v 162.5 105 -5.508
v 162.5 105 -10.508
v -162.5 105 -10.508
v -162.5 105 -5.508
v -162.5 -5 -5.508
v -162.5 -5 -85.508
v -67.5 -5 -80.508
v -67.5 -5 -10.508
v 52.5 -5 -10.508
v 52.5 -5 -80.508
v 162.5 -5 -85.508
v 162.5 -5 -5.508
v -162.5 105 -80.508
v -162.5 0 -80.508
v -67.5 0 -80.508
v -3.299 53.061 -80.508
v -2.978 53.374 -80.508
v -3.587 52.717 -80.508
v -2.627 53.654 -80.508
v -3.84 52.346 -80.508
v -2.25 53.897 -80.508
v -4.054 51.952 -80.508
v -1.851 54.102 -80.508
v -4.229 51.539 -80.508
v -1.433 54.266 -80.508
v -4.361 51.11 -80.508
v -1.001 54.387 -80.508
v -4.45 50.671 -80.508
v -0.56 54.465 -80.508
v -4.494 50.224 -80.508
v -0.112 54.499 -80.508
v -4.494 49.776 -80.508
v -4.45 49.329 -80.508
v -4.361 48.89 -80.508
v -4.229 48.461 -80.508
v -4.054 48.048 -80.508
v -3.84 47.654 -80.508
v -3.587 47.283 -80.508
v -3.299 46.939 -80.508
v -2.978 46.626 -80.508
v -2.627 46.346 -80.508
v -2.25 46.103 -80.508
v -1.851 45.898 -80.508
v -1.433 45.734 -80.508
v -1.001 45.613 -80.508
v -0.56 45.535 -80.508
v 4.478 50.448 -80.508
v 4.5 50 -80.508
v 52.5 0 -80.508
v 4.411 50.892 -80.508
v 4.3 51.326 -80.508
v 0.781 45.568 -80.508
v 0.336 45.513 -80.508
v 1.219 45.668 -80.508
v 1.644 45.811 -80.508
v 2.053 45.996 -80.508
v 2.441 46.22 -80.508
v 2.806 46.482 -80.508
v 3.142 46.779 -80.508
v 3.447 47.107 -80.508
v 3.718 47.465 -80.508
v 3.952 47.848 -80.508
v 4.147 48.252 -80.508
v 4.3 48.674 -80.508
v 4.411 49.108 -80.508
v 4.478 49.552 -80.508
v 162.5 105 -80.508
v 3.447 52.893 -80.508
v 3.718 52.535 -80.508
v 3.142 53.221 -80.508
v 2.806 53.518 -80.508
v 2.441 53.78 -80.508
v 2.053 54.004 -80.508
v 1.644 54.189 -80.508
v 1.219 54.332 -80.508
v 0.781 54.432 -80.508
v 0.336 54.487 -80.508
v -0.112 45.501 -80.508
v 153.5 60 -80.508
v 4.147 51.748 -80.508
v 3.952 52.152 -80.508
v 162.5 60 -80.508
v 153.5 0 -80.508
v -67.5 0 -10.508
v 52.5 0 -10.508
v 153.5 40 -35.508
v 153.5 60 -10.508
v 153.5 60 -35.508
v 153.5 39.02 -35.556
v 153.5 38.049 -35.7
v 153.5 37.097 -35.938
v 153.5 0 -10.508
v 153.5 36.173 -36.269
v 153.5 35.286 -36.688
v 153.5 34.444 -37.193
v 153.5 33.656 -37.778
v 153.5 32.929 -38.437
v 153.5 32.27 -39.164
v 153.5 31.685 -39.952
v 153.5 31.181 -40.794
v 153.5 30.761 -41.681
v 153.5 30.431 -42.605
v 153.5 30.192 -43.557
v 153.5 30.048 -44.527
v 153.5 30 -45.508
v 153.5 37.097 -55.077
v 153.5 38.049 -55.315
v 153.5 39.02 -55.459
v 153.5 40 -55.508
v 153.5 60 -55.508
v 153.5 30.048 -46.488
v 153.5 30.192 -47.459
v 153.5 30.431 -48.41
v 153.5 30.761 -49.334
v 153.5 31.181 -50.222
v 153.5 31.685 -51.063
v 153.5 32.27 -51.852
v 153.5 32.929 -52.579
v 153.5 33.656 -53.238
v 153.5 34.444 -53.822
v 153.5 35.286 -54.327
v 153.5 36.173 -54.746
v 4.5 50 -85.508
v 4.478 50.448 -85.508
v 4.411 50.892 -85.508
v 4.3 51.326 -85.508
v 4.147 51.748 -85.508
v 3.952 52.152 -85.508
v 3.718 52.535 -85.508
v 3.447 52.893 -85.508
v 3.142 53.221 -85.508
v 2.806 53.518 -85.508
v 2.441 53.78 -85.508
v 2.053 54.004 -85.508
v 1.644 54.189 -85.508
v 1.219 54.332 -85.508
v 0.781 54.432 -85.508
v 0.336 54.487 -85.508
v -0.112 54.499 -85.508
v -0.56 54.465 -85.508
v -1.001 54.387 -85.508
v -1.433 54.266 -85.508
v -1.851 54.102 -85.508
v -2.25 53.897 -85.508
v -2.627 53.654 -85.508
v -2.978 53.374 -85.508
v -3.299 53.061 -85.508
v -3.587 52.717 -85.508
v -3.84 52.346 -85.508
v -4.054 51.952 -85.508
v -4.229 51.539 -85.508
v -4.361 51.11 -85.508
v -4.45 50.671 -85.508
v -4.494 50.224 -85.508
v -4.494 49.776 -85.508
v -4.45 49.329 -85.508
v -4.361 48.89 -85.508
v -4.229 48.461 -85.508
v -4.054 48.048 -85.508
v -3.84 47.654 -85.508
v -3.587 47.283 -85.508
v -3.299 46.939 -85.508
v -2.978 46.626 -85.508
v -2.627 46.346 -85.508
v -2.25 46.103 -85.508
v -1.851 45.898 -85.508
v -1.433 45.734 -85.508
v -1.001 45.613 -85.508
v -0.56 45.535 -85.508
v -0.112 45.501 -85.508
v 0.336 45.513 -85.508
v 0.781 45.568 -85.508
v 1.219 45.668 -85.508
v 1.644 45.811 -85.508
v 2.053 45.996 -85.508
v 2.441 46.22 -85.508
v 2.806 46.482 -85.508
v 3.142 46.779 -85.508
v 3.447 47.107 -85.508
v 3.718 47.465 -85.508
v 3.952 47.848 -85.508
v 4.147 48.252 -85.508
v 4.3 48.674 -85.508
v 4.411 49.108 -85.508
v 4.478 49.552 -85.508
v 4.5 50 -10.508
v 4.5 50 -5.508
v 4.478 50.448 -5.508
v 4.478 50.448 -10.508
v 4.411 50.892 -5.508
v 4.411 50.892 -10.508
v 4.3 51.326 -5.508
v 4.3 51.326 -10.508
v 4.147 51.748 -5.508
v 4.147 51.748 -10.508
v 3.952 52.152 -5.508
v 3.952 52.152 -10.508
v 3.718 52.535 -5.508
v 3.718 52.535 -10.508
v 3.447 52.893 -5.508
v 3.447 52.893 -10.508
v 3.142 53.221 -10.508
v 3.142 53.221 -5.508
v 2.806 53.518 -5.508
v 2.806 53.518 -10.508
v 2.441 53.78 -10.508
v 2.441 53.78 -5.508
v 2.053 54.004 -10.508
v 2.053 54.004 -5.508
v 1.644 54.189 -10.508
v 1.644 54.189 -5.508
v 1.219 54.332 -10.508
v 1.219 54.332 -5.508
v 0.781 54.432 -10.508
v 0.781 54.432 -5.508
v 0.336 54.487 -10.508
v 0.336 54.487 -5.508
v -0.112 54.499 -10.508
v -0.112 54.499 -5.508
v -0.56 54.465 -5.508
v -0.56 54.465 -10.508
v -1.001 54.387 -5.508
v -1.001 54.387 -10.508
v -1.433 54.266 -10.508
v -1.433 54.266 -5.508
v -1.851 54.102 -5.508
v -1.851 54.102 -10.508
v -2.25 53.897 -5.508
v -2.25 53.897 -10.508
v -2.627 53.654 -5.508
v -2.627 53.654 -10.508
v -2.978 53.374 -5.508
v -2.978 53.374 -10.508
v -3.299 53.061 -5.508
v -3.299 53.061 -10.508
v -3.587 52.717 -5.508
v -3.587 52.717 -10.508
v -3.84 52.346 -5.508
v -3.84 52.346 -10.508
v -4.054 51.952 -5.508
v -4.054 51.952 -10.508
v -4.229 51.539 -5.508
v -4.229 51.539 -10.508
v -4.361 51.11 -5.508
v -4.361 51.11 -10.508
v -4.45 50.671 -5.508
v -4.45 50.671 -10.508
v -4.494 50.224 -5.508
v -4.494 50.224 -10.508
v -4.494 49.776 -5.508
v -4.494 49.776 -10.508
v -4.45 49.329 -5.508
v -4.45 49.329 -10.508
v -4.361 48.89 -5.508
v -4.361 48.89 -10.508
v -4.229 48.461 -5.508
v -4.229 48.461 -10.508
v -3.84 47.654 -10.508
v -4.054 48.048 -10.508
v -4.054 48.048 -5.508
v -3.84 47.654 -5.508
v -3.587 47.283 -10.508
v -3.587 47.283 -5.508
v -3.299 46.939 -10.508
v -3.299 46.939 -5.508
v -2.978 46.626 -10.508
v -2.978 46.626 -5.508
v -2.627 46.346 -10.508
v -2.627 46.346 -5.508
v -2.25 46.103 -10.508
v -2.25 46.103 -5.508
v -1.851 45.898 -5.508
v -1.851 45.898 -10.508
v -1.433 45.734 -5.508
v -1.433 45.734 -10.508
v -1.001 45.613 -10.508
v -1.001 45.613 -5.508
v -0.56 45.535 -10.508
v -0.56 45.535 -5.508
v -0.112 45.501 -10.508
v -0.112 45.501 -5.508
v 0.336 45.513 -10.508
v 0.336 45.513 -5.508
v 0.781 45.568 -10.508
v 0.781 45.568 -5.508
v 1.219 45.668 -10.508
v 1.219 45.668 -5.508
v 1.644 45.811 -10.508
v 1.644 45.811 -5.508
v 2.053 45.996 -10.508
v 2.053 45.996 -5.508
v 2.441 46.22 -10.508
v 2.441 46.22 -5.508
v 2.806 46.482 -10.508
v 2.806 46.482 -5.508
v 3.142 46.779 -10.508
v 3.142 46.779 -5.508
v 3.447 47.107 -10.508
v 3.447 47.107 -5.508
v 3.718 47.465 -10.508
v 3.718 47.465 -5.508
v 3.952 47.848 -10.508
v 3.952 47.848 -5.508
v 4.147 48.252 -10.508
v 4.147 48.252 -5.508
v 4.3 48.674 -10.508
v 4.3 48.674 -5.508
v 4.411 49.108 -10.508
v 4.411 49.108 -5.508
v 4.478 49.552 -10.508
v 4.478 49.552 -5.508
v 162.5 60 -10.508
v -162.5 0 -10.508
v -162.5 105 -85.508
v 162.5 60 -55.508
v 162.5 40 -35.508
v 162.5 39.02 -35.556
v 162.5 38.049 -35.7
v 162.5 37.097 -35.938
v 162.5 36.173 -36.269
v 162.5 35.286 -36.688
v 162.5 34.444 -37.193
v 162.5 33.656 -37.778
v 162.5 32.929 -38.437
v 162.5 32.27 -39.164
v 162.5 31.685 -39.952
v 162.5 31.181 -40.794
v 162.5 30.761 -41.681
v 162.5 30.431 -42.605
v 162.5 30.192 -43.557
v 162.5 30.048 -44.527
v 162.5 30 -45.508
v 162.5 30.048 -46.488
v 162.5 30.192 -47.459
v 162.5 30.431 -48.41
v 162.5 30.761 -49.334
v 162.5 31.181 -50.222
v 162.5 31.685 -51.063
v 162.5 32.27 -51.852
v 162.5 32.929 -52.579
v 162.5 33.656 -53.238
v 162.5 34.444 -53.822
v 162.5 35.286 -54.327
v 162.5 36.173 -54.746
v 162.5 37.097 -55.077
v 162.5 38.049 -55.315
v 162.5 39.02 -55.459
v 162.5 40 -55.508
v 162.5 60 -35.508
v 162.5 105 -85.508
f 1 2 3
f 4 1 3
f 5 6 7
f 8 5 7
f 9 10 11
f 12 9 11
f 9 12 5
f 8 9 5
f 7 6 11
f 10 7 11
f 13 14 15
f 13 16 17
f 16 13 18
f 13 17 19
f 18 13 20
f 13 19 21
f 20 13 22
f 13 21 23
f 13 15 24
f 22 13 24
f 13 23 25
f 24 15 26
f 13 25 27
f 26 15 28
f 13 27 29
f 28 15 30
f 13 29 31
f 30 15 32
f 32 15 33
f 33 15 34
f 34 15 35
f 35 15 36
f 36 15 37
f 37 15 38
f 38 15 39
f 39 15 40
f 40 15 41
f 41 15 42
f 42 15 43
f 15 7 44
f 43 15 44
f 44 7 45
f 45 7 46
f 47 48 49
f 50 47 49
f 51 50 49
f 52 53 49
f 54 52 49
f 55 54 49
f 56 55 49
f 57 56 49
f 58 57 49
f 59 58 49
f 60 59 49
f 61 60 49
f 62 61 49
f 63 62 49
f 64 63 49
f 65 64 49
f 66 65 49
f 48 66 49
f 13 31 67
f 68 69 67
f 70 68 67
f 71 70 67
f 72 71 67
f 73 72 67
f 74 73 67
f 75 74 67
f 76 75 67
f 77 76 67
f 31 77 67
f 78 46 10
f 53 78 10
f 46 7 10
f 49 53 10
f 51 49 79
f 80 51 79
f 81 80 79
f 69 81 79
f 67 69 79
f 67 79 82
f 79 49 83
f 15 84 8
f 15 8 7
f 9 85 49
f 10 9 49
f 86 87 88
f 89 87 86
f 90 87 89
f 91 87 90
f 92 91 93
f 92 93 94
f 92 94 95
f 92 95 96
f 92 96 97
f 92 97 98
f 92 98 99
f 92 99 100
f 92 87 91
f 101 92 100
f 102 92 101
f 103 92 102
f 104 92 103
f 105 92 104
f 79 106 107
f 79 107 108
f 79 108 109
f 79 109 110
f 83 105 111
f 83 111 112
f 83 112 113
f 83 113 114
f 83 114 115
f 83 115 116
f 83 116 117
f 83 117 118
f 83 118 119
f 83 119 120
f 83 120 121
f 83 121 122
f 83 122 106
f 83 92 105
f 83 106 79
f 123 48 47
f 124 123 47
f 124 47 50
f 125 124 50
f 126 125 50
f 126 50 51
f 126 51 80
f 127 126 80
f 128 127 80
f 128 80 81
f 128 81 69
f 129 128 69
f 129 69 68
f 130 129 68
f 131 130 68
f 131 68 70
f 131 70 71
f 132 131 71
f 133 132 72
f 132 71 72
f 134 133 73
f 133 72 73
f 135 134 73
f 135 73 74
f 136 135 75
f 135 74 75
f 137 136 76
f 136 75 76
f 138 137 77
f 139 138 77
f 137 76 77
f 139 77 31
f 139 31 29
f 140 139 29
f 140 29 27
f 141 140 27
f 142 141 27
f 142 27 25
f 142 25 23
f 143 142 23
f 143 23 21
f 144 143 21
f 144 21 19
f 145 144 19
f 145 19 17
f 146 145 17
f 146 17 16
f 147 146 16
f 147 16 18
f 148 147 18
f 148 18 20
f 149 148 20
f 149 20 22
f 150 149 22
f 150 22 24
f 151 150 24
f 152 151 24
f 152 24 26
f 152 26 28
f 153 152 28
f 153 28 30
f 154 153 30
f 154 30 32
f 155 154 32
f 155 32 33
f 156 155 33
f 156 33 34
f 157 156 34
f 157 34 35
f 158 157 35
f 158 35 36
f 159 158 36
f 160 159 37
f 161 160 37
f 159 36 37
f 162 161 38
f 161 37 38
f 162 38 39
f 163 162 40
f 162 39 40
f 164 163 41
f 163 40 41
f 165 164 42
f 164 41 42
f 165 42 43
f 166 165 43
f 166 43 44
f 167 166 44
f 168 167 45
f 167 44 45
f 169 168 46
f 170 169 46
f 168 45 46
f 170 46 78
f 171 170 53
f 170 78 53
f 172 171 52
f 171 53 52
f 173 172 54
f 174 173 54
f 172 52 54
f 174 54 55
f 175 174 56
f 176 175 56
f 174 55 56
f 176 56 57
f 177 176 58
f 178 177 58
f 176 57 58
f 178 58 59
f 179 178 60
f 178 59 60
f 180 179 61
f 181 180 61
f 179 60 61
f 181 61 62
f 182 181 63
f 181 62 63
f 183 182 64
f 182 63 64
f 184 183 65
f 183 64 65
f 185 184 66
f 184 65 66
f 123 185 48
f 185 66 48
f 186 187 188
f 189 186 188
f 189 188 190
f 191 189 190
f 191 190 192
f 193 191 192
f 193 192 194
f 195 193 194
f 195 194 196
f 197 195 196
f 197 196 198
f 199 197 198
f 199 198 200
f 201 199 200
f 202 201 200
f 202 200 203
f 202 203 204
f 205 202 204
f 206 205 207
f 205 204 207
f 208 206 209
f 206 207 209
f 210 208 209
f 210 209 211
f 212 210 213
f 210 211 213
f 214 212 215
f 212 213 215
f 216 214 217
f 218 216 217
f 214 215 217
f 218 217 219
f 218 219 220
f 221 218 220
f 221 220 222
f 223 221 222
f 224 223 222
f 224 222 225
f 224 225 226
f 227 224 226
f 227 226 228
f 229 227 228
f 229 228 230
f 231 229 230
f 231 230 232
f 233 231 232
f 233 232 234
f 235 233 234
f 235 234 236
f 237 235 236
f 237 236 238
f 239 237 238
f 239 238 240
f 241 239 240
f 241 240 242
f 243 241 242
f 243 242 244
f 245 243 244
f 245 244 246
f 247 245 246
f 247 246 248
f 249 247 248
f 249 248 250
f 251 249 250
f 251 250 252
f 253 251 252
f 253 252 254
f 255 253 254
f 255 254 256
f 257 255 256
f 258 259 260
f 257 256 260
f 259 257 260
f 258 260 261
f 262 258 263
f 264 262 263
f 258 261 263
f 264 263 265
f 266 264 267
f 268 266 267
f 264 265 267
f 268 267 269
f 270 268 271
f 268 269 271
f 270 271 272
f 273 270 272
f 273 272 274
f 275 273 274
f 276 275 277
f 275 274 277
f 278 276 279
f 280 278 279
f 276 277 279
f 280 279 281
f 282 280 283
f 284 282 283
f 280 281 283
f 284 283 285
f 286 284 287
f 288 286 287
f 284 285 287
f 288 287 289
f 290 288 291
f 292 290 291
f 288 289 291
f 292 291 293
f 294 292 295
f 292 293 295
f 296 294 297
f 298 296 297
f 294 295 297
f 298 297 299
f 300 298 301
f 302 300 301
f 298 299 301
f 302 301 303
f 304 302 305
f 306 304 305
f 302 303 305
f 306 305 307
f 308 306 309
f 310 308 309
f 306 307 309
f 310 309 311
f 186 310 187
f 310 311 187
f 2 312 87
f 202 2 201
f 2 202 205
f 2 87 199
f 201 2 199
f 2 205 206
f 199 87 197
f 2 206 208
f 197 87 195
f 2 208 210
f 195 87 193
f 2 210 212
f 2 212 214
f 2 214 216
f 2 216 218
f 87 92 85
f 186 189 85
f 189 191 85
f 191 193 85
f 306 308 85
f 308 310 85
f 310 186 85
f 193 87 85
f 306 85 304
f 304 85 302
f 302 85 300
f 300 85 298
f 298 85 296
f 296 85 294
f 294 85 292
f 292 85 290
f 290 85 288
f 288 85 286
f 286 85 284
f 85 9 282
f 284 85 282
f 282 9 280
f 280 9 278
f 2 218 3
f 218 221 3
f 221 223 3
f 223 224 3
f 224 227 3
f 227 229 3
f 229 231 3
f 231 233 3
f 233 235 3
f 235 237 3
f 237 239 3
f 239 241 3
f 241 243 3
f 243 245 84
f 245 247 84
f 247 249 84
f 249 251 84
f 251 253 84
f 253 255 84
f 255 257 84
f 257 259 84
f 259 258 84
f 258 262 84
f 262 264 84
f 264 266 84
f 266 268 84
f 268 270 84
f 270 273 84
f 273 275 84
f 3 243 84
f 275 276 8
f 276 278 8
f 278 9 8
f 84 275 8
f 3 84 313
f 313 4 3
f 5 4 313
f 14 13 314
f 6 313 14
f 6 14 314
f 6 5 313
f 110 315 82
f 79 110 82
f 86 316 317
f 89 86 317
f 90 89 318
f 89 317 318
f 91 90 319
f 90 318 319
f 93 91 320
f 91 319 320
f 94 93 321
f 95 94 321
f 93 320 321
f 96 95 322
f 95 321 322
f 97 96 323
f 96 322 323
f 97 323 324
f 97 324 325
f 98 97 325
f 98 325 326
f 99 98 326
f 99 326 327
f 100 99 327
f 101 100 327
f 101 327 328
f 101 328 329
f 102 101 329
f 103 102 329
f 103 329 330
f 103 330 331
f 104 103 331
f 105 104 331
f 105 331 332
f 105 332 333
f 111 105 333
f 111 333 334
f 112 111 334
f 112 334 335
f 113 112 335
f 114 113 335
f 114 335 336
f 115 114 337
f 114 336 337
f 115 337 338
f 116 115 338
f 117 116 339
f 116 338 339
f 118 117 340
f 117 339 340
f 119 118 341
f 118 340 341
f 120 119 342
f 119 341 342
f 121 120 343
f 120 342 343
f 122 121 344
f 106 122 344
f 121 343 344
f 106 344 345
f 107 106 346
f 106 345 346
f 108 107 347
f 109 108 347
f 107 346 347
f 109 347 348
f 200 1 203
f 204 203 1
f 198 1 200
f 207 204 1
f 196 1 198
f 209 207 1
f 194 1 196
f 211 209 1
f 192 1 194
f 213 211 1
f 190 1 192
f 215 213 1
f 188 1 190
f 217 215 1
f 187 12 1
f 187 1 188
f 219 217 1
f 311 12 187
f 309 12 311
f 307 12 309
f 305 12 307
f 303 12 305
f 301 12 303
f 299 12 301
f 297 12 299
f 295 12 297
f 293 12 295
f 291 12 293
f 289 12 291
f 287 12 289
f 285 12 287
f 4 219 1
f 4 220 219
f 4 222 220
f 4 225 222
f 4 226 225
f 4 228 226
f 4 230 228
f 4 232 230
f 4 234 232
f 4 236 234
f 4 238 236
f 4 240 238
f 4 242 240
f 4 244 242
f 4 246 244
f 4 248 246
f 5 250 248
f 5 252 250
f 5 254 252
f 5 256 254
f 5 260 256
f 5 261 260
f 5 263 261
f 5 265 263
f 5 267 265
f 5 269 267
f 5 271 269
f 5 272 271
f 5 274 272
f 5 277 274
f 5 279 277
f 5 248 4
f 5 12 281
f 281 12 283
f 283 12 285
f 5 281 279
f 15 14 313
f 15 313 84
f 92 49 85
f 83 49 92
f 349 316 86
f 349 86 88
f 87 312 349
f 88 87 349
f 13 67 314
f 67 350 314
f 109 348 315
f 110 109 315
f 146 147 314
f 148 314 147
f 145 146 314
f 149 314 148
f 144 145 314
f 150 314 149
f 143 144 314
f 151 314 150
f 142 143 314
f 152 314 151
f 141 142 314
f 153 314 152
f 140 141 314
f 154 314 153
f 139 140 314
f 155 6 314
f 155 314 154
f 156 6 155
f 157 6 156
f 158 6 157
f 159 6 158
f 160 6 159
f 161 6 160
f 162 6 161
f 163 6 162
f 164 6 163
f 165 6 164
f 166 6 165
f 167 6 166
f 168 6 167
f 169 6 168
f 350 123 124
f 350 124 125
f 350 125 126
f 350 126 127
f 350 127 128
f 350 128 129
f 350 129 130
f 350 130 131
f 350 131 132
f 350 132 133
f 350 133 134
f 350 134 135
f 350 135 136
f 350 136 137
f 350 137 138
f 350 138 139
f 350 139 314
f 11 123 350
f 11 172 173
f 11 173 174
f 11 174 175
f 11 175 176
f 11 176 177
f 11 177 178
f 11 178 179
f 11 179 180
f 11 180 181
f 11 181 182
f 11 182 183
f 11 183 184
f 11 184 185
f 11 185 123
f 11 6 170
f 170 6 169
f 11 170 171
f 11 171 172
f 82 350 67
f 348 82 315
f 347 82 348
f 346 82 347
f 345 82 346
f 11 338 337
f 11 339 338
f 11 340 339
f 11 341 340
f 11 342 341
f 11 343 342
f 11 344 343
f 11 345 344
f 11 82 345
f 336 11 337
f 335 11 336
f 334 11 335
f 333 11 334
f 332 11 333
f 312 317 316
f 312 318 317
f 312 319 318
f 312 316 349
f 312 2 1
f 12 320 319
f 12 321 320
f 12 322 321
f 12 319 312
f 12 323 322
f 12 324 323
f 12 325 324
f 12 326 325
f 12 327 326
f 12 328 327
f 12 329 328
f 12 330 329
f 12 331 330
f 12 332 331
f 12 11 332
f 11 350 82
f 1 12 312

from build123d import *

# Parameters (mm, degrees)
SKETCH1_W               = 325
SKETCH1_H               = 80
BOSS_EXTRUDE1_DEPTH     = 5
BOSS_EXTRUDE2_DEPTH     = 105
SKETCH3_R               = 4.5
CUT_EXTRUDE1_DEPTH      = 1
CUT_EXTRUDE1_DEPTH_BACK = 81
SKETCH4_W               = 120
SKETCH4_H               = 70
CUT_EXTRUDE2_DEPTH      = 105
SKETCH5_W               = 20
SKETCH5_H               = 20
CUT_EXTRUDE3_DEPTH      = 105


with BuildPart() as part:
    # Sketch1 → Boss-Extrude1 (new body)
    with BuildSketch(Plane(origin=(0, 0, 0), x_dir=(1, 0, 0), z_dir=(0, 1, 0))):
        with Locations((0, 45.507641921)):
            Rectangle(SKETCH1_W, SKETCH1_H)
    extrude(amount=-BOSS_EXTRUDE1_DEPTH)

    # Sketch2 → Boss-Extrude2 (add)
    with BuildSketch(Plane(origin=(0, 0, 0), x_dir=(1, 0, 0), z_dir=(0, 1, 0))):
        Polygon((-150.609375415, 80.507641921), (-162.5, 80.507641921), (-162.5, 85.507641921), (162.5, 85.507641921), (162.5, 5.507641921), (-162.5, 5.507641921), (-162.5, 10.507641921), (-150.609375415, 10.507641921), (153.5, 10.507641921), (153.5, 80.507641921), align=None)
    extrude(amount=BOSS_EXTRUDE2_DEPTH)

    # Sketch3 → Cut-Extrude1 (cut, two sides)
    with BuildSketch(Plane.XY.offset(-5.507641921)) as cut_extrude1_sk:
        with Locations((0, 50)):
            Circle(SKETCH3_R)
    extrude(amount=CUT_EXTRUDE1_DEPTH, mode=Mode.SUBTRACT)
    extrude(cut_extrude1_sk.sketch, amount=-CUT_EXTRUDE1_DEPTH_BACK, mode=Mode.SUBTRACT)

    # Sketch4 → Cut-Extrude2 (cut)
    with BuildSketch(Plane(origin=(0, 0, 0), x_dir=(1, 0, 0), z_dir=(0, 1, 0))):
        with Locations((-7.5, 45.507641921)):
            Rectangle(SKETCH4_W, SKETCH4_H)
    extrude(amount=-CUT_EXTRUDE2_DEPTH, mode=Mode.SUBTRACT)

    # Sketch5 → Cut-Extrude3 (cut)
    with BuildSketch(Plane(origin=(162.5, 0, 0), x_dir=(0, 0, -1), z_dir=(1, 0, 0))):
        Polygon((80.507641921, 105), (10.507641921, 105), (10.507641921, 60), (35.507641921, 60), (55.507641921, 60), (80.507641921, 60), align=None)
        with Locations((45.507641921, 50)):
            Rectangle(SKETCH5_W, SKETCH5_H)
        with BuildLine():
            Line((55.507641921, 40), (35.507641921, 40))
            ThreePointArc((35.507641921, 40), (45.507641921, 30), (55.507641921, 40))
        make_face()
    extrude(amount=-CUT_EXTRUDE3_DEPTH, mode=Mode.SUBTRACT)


solid = part.part
